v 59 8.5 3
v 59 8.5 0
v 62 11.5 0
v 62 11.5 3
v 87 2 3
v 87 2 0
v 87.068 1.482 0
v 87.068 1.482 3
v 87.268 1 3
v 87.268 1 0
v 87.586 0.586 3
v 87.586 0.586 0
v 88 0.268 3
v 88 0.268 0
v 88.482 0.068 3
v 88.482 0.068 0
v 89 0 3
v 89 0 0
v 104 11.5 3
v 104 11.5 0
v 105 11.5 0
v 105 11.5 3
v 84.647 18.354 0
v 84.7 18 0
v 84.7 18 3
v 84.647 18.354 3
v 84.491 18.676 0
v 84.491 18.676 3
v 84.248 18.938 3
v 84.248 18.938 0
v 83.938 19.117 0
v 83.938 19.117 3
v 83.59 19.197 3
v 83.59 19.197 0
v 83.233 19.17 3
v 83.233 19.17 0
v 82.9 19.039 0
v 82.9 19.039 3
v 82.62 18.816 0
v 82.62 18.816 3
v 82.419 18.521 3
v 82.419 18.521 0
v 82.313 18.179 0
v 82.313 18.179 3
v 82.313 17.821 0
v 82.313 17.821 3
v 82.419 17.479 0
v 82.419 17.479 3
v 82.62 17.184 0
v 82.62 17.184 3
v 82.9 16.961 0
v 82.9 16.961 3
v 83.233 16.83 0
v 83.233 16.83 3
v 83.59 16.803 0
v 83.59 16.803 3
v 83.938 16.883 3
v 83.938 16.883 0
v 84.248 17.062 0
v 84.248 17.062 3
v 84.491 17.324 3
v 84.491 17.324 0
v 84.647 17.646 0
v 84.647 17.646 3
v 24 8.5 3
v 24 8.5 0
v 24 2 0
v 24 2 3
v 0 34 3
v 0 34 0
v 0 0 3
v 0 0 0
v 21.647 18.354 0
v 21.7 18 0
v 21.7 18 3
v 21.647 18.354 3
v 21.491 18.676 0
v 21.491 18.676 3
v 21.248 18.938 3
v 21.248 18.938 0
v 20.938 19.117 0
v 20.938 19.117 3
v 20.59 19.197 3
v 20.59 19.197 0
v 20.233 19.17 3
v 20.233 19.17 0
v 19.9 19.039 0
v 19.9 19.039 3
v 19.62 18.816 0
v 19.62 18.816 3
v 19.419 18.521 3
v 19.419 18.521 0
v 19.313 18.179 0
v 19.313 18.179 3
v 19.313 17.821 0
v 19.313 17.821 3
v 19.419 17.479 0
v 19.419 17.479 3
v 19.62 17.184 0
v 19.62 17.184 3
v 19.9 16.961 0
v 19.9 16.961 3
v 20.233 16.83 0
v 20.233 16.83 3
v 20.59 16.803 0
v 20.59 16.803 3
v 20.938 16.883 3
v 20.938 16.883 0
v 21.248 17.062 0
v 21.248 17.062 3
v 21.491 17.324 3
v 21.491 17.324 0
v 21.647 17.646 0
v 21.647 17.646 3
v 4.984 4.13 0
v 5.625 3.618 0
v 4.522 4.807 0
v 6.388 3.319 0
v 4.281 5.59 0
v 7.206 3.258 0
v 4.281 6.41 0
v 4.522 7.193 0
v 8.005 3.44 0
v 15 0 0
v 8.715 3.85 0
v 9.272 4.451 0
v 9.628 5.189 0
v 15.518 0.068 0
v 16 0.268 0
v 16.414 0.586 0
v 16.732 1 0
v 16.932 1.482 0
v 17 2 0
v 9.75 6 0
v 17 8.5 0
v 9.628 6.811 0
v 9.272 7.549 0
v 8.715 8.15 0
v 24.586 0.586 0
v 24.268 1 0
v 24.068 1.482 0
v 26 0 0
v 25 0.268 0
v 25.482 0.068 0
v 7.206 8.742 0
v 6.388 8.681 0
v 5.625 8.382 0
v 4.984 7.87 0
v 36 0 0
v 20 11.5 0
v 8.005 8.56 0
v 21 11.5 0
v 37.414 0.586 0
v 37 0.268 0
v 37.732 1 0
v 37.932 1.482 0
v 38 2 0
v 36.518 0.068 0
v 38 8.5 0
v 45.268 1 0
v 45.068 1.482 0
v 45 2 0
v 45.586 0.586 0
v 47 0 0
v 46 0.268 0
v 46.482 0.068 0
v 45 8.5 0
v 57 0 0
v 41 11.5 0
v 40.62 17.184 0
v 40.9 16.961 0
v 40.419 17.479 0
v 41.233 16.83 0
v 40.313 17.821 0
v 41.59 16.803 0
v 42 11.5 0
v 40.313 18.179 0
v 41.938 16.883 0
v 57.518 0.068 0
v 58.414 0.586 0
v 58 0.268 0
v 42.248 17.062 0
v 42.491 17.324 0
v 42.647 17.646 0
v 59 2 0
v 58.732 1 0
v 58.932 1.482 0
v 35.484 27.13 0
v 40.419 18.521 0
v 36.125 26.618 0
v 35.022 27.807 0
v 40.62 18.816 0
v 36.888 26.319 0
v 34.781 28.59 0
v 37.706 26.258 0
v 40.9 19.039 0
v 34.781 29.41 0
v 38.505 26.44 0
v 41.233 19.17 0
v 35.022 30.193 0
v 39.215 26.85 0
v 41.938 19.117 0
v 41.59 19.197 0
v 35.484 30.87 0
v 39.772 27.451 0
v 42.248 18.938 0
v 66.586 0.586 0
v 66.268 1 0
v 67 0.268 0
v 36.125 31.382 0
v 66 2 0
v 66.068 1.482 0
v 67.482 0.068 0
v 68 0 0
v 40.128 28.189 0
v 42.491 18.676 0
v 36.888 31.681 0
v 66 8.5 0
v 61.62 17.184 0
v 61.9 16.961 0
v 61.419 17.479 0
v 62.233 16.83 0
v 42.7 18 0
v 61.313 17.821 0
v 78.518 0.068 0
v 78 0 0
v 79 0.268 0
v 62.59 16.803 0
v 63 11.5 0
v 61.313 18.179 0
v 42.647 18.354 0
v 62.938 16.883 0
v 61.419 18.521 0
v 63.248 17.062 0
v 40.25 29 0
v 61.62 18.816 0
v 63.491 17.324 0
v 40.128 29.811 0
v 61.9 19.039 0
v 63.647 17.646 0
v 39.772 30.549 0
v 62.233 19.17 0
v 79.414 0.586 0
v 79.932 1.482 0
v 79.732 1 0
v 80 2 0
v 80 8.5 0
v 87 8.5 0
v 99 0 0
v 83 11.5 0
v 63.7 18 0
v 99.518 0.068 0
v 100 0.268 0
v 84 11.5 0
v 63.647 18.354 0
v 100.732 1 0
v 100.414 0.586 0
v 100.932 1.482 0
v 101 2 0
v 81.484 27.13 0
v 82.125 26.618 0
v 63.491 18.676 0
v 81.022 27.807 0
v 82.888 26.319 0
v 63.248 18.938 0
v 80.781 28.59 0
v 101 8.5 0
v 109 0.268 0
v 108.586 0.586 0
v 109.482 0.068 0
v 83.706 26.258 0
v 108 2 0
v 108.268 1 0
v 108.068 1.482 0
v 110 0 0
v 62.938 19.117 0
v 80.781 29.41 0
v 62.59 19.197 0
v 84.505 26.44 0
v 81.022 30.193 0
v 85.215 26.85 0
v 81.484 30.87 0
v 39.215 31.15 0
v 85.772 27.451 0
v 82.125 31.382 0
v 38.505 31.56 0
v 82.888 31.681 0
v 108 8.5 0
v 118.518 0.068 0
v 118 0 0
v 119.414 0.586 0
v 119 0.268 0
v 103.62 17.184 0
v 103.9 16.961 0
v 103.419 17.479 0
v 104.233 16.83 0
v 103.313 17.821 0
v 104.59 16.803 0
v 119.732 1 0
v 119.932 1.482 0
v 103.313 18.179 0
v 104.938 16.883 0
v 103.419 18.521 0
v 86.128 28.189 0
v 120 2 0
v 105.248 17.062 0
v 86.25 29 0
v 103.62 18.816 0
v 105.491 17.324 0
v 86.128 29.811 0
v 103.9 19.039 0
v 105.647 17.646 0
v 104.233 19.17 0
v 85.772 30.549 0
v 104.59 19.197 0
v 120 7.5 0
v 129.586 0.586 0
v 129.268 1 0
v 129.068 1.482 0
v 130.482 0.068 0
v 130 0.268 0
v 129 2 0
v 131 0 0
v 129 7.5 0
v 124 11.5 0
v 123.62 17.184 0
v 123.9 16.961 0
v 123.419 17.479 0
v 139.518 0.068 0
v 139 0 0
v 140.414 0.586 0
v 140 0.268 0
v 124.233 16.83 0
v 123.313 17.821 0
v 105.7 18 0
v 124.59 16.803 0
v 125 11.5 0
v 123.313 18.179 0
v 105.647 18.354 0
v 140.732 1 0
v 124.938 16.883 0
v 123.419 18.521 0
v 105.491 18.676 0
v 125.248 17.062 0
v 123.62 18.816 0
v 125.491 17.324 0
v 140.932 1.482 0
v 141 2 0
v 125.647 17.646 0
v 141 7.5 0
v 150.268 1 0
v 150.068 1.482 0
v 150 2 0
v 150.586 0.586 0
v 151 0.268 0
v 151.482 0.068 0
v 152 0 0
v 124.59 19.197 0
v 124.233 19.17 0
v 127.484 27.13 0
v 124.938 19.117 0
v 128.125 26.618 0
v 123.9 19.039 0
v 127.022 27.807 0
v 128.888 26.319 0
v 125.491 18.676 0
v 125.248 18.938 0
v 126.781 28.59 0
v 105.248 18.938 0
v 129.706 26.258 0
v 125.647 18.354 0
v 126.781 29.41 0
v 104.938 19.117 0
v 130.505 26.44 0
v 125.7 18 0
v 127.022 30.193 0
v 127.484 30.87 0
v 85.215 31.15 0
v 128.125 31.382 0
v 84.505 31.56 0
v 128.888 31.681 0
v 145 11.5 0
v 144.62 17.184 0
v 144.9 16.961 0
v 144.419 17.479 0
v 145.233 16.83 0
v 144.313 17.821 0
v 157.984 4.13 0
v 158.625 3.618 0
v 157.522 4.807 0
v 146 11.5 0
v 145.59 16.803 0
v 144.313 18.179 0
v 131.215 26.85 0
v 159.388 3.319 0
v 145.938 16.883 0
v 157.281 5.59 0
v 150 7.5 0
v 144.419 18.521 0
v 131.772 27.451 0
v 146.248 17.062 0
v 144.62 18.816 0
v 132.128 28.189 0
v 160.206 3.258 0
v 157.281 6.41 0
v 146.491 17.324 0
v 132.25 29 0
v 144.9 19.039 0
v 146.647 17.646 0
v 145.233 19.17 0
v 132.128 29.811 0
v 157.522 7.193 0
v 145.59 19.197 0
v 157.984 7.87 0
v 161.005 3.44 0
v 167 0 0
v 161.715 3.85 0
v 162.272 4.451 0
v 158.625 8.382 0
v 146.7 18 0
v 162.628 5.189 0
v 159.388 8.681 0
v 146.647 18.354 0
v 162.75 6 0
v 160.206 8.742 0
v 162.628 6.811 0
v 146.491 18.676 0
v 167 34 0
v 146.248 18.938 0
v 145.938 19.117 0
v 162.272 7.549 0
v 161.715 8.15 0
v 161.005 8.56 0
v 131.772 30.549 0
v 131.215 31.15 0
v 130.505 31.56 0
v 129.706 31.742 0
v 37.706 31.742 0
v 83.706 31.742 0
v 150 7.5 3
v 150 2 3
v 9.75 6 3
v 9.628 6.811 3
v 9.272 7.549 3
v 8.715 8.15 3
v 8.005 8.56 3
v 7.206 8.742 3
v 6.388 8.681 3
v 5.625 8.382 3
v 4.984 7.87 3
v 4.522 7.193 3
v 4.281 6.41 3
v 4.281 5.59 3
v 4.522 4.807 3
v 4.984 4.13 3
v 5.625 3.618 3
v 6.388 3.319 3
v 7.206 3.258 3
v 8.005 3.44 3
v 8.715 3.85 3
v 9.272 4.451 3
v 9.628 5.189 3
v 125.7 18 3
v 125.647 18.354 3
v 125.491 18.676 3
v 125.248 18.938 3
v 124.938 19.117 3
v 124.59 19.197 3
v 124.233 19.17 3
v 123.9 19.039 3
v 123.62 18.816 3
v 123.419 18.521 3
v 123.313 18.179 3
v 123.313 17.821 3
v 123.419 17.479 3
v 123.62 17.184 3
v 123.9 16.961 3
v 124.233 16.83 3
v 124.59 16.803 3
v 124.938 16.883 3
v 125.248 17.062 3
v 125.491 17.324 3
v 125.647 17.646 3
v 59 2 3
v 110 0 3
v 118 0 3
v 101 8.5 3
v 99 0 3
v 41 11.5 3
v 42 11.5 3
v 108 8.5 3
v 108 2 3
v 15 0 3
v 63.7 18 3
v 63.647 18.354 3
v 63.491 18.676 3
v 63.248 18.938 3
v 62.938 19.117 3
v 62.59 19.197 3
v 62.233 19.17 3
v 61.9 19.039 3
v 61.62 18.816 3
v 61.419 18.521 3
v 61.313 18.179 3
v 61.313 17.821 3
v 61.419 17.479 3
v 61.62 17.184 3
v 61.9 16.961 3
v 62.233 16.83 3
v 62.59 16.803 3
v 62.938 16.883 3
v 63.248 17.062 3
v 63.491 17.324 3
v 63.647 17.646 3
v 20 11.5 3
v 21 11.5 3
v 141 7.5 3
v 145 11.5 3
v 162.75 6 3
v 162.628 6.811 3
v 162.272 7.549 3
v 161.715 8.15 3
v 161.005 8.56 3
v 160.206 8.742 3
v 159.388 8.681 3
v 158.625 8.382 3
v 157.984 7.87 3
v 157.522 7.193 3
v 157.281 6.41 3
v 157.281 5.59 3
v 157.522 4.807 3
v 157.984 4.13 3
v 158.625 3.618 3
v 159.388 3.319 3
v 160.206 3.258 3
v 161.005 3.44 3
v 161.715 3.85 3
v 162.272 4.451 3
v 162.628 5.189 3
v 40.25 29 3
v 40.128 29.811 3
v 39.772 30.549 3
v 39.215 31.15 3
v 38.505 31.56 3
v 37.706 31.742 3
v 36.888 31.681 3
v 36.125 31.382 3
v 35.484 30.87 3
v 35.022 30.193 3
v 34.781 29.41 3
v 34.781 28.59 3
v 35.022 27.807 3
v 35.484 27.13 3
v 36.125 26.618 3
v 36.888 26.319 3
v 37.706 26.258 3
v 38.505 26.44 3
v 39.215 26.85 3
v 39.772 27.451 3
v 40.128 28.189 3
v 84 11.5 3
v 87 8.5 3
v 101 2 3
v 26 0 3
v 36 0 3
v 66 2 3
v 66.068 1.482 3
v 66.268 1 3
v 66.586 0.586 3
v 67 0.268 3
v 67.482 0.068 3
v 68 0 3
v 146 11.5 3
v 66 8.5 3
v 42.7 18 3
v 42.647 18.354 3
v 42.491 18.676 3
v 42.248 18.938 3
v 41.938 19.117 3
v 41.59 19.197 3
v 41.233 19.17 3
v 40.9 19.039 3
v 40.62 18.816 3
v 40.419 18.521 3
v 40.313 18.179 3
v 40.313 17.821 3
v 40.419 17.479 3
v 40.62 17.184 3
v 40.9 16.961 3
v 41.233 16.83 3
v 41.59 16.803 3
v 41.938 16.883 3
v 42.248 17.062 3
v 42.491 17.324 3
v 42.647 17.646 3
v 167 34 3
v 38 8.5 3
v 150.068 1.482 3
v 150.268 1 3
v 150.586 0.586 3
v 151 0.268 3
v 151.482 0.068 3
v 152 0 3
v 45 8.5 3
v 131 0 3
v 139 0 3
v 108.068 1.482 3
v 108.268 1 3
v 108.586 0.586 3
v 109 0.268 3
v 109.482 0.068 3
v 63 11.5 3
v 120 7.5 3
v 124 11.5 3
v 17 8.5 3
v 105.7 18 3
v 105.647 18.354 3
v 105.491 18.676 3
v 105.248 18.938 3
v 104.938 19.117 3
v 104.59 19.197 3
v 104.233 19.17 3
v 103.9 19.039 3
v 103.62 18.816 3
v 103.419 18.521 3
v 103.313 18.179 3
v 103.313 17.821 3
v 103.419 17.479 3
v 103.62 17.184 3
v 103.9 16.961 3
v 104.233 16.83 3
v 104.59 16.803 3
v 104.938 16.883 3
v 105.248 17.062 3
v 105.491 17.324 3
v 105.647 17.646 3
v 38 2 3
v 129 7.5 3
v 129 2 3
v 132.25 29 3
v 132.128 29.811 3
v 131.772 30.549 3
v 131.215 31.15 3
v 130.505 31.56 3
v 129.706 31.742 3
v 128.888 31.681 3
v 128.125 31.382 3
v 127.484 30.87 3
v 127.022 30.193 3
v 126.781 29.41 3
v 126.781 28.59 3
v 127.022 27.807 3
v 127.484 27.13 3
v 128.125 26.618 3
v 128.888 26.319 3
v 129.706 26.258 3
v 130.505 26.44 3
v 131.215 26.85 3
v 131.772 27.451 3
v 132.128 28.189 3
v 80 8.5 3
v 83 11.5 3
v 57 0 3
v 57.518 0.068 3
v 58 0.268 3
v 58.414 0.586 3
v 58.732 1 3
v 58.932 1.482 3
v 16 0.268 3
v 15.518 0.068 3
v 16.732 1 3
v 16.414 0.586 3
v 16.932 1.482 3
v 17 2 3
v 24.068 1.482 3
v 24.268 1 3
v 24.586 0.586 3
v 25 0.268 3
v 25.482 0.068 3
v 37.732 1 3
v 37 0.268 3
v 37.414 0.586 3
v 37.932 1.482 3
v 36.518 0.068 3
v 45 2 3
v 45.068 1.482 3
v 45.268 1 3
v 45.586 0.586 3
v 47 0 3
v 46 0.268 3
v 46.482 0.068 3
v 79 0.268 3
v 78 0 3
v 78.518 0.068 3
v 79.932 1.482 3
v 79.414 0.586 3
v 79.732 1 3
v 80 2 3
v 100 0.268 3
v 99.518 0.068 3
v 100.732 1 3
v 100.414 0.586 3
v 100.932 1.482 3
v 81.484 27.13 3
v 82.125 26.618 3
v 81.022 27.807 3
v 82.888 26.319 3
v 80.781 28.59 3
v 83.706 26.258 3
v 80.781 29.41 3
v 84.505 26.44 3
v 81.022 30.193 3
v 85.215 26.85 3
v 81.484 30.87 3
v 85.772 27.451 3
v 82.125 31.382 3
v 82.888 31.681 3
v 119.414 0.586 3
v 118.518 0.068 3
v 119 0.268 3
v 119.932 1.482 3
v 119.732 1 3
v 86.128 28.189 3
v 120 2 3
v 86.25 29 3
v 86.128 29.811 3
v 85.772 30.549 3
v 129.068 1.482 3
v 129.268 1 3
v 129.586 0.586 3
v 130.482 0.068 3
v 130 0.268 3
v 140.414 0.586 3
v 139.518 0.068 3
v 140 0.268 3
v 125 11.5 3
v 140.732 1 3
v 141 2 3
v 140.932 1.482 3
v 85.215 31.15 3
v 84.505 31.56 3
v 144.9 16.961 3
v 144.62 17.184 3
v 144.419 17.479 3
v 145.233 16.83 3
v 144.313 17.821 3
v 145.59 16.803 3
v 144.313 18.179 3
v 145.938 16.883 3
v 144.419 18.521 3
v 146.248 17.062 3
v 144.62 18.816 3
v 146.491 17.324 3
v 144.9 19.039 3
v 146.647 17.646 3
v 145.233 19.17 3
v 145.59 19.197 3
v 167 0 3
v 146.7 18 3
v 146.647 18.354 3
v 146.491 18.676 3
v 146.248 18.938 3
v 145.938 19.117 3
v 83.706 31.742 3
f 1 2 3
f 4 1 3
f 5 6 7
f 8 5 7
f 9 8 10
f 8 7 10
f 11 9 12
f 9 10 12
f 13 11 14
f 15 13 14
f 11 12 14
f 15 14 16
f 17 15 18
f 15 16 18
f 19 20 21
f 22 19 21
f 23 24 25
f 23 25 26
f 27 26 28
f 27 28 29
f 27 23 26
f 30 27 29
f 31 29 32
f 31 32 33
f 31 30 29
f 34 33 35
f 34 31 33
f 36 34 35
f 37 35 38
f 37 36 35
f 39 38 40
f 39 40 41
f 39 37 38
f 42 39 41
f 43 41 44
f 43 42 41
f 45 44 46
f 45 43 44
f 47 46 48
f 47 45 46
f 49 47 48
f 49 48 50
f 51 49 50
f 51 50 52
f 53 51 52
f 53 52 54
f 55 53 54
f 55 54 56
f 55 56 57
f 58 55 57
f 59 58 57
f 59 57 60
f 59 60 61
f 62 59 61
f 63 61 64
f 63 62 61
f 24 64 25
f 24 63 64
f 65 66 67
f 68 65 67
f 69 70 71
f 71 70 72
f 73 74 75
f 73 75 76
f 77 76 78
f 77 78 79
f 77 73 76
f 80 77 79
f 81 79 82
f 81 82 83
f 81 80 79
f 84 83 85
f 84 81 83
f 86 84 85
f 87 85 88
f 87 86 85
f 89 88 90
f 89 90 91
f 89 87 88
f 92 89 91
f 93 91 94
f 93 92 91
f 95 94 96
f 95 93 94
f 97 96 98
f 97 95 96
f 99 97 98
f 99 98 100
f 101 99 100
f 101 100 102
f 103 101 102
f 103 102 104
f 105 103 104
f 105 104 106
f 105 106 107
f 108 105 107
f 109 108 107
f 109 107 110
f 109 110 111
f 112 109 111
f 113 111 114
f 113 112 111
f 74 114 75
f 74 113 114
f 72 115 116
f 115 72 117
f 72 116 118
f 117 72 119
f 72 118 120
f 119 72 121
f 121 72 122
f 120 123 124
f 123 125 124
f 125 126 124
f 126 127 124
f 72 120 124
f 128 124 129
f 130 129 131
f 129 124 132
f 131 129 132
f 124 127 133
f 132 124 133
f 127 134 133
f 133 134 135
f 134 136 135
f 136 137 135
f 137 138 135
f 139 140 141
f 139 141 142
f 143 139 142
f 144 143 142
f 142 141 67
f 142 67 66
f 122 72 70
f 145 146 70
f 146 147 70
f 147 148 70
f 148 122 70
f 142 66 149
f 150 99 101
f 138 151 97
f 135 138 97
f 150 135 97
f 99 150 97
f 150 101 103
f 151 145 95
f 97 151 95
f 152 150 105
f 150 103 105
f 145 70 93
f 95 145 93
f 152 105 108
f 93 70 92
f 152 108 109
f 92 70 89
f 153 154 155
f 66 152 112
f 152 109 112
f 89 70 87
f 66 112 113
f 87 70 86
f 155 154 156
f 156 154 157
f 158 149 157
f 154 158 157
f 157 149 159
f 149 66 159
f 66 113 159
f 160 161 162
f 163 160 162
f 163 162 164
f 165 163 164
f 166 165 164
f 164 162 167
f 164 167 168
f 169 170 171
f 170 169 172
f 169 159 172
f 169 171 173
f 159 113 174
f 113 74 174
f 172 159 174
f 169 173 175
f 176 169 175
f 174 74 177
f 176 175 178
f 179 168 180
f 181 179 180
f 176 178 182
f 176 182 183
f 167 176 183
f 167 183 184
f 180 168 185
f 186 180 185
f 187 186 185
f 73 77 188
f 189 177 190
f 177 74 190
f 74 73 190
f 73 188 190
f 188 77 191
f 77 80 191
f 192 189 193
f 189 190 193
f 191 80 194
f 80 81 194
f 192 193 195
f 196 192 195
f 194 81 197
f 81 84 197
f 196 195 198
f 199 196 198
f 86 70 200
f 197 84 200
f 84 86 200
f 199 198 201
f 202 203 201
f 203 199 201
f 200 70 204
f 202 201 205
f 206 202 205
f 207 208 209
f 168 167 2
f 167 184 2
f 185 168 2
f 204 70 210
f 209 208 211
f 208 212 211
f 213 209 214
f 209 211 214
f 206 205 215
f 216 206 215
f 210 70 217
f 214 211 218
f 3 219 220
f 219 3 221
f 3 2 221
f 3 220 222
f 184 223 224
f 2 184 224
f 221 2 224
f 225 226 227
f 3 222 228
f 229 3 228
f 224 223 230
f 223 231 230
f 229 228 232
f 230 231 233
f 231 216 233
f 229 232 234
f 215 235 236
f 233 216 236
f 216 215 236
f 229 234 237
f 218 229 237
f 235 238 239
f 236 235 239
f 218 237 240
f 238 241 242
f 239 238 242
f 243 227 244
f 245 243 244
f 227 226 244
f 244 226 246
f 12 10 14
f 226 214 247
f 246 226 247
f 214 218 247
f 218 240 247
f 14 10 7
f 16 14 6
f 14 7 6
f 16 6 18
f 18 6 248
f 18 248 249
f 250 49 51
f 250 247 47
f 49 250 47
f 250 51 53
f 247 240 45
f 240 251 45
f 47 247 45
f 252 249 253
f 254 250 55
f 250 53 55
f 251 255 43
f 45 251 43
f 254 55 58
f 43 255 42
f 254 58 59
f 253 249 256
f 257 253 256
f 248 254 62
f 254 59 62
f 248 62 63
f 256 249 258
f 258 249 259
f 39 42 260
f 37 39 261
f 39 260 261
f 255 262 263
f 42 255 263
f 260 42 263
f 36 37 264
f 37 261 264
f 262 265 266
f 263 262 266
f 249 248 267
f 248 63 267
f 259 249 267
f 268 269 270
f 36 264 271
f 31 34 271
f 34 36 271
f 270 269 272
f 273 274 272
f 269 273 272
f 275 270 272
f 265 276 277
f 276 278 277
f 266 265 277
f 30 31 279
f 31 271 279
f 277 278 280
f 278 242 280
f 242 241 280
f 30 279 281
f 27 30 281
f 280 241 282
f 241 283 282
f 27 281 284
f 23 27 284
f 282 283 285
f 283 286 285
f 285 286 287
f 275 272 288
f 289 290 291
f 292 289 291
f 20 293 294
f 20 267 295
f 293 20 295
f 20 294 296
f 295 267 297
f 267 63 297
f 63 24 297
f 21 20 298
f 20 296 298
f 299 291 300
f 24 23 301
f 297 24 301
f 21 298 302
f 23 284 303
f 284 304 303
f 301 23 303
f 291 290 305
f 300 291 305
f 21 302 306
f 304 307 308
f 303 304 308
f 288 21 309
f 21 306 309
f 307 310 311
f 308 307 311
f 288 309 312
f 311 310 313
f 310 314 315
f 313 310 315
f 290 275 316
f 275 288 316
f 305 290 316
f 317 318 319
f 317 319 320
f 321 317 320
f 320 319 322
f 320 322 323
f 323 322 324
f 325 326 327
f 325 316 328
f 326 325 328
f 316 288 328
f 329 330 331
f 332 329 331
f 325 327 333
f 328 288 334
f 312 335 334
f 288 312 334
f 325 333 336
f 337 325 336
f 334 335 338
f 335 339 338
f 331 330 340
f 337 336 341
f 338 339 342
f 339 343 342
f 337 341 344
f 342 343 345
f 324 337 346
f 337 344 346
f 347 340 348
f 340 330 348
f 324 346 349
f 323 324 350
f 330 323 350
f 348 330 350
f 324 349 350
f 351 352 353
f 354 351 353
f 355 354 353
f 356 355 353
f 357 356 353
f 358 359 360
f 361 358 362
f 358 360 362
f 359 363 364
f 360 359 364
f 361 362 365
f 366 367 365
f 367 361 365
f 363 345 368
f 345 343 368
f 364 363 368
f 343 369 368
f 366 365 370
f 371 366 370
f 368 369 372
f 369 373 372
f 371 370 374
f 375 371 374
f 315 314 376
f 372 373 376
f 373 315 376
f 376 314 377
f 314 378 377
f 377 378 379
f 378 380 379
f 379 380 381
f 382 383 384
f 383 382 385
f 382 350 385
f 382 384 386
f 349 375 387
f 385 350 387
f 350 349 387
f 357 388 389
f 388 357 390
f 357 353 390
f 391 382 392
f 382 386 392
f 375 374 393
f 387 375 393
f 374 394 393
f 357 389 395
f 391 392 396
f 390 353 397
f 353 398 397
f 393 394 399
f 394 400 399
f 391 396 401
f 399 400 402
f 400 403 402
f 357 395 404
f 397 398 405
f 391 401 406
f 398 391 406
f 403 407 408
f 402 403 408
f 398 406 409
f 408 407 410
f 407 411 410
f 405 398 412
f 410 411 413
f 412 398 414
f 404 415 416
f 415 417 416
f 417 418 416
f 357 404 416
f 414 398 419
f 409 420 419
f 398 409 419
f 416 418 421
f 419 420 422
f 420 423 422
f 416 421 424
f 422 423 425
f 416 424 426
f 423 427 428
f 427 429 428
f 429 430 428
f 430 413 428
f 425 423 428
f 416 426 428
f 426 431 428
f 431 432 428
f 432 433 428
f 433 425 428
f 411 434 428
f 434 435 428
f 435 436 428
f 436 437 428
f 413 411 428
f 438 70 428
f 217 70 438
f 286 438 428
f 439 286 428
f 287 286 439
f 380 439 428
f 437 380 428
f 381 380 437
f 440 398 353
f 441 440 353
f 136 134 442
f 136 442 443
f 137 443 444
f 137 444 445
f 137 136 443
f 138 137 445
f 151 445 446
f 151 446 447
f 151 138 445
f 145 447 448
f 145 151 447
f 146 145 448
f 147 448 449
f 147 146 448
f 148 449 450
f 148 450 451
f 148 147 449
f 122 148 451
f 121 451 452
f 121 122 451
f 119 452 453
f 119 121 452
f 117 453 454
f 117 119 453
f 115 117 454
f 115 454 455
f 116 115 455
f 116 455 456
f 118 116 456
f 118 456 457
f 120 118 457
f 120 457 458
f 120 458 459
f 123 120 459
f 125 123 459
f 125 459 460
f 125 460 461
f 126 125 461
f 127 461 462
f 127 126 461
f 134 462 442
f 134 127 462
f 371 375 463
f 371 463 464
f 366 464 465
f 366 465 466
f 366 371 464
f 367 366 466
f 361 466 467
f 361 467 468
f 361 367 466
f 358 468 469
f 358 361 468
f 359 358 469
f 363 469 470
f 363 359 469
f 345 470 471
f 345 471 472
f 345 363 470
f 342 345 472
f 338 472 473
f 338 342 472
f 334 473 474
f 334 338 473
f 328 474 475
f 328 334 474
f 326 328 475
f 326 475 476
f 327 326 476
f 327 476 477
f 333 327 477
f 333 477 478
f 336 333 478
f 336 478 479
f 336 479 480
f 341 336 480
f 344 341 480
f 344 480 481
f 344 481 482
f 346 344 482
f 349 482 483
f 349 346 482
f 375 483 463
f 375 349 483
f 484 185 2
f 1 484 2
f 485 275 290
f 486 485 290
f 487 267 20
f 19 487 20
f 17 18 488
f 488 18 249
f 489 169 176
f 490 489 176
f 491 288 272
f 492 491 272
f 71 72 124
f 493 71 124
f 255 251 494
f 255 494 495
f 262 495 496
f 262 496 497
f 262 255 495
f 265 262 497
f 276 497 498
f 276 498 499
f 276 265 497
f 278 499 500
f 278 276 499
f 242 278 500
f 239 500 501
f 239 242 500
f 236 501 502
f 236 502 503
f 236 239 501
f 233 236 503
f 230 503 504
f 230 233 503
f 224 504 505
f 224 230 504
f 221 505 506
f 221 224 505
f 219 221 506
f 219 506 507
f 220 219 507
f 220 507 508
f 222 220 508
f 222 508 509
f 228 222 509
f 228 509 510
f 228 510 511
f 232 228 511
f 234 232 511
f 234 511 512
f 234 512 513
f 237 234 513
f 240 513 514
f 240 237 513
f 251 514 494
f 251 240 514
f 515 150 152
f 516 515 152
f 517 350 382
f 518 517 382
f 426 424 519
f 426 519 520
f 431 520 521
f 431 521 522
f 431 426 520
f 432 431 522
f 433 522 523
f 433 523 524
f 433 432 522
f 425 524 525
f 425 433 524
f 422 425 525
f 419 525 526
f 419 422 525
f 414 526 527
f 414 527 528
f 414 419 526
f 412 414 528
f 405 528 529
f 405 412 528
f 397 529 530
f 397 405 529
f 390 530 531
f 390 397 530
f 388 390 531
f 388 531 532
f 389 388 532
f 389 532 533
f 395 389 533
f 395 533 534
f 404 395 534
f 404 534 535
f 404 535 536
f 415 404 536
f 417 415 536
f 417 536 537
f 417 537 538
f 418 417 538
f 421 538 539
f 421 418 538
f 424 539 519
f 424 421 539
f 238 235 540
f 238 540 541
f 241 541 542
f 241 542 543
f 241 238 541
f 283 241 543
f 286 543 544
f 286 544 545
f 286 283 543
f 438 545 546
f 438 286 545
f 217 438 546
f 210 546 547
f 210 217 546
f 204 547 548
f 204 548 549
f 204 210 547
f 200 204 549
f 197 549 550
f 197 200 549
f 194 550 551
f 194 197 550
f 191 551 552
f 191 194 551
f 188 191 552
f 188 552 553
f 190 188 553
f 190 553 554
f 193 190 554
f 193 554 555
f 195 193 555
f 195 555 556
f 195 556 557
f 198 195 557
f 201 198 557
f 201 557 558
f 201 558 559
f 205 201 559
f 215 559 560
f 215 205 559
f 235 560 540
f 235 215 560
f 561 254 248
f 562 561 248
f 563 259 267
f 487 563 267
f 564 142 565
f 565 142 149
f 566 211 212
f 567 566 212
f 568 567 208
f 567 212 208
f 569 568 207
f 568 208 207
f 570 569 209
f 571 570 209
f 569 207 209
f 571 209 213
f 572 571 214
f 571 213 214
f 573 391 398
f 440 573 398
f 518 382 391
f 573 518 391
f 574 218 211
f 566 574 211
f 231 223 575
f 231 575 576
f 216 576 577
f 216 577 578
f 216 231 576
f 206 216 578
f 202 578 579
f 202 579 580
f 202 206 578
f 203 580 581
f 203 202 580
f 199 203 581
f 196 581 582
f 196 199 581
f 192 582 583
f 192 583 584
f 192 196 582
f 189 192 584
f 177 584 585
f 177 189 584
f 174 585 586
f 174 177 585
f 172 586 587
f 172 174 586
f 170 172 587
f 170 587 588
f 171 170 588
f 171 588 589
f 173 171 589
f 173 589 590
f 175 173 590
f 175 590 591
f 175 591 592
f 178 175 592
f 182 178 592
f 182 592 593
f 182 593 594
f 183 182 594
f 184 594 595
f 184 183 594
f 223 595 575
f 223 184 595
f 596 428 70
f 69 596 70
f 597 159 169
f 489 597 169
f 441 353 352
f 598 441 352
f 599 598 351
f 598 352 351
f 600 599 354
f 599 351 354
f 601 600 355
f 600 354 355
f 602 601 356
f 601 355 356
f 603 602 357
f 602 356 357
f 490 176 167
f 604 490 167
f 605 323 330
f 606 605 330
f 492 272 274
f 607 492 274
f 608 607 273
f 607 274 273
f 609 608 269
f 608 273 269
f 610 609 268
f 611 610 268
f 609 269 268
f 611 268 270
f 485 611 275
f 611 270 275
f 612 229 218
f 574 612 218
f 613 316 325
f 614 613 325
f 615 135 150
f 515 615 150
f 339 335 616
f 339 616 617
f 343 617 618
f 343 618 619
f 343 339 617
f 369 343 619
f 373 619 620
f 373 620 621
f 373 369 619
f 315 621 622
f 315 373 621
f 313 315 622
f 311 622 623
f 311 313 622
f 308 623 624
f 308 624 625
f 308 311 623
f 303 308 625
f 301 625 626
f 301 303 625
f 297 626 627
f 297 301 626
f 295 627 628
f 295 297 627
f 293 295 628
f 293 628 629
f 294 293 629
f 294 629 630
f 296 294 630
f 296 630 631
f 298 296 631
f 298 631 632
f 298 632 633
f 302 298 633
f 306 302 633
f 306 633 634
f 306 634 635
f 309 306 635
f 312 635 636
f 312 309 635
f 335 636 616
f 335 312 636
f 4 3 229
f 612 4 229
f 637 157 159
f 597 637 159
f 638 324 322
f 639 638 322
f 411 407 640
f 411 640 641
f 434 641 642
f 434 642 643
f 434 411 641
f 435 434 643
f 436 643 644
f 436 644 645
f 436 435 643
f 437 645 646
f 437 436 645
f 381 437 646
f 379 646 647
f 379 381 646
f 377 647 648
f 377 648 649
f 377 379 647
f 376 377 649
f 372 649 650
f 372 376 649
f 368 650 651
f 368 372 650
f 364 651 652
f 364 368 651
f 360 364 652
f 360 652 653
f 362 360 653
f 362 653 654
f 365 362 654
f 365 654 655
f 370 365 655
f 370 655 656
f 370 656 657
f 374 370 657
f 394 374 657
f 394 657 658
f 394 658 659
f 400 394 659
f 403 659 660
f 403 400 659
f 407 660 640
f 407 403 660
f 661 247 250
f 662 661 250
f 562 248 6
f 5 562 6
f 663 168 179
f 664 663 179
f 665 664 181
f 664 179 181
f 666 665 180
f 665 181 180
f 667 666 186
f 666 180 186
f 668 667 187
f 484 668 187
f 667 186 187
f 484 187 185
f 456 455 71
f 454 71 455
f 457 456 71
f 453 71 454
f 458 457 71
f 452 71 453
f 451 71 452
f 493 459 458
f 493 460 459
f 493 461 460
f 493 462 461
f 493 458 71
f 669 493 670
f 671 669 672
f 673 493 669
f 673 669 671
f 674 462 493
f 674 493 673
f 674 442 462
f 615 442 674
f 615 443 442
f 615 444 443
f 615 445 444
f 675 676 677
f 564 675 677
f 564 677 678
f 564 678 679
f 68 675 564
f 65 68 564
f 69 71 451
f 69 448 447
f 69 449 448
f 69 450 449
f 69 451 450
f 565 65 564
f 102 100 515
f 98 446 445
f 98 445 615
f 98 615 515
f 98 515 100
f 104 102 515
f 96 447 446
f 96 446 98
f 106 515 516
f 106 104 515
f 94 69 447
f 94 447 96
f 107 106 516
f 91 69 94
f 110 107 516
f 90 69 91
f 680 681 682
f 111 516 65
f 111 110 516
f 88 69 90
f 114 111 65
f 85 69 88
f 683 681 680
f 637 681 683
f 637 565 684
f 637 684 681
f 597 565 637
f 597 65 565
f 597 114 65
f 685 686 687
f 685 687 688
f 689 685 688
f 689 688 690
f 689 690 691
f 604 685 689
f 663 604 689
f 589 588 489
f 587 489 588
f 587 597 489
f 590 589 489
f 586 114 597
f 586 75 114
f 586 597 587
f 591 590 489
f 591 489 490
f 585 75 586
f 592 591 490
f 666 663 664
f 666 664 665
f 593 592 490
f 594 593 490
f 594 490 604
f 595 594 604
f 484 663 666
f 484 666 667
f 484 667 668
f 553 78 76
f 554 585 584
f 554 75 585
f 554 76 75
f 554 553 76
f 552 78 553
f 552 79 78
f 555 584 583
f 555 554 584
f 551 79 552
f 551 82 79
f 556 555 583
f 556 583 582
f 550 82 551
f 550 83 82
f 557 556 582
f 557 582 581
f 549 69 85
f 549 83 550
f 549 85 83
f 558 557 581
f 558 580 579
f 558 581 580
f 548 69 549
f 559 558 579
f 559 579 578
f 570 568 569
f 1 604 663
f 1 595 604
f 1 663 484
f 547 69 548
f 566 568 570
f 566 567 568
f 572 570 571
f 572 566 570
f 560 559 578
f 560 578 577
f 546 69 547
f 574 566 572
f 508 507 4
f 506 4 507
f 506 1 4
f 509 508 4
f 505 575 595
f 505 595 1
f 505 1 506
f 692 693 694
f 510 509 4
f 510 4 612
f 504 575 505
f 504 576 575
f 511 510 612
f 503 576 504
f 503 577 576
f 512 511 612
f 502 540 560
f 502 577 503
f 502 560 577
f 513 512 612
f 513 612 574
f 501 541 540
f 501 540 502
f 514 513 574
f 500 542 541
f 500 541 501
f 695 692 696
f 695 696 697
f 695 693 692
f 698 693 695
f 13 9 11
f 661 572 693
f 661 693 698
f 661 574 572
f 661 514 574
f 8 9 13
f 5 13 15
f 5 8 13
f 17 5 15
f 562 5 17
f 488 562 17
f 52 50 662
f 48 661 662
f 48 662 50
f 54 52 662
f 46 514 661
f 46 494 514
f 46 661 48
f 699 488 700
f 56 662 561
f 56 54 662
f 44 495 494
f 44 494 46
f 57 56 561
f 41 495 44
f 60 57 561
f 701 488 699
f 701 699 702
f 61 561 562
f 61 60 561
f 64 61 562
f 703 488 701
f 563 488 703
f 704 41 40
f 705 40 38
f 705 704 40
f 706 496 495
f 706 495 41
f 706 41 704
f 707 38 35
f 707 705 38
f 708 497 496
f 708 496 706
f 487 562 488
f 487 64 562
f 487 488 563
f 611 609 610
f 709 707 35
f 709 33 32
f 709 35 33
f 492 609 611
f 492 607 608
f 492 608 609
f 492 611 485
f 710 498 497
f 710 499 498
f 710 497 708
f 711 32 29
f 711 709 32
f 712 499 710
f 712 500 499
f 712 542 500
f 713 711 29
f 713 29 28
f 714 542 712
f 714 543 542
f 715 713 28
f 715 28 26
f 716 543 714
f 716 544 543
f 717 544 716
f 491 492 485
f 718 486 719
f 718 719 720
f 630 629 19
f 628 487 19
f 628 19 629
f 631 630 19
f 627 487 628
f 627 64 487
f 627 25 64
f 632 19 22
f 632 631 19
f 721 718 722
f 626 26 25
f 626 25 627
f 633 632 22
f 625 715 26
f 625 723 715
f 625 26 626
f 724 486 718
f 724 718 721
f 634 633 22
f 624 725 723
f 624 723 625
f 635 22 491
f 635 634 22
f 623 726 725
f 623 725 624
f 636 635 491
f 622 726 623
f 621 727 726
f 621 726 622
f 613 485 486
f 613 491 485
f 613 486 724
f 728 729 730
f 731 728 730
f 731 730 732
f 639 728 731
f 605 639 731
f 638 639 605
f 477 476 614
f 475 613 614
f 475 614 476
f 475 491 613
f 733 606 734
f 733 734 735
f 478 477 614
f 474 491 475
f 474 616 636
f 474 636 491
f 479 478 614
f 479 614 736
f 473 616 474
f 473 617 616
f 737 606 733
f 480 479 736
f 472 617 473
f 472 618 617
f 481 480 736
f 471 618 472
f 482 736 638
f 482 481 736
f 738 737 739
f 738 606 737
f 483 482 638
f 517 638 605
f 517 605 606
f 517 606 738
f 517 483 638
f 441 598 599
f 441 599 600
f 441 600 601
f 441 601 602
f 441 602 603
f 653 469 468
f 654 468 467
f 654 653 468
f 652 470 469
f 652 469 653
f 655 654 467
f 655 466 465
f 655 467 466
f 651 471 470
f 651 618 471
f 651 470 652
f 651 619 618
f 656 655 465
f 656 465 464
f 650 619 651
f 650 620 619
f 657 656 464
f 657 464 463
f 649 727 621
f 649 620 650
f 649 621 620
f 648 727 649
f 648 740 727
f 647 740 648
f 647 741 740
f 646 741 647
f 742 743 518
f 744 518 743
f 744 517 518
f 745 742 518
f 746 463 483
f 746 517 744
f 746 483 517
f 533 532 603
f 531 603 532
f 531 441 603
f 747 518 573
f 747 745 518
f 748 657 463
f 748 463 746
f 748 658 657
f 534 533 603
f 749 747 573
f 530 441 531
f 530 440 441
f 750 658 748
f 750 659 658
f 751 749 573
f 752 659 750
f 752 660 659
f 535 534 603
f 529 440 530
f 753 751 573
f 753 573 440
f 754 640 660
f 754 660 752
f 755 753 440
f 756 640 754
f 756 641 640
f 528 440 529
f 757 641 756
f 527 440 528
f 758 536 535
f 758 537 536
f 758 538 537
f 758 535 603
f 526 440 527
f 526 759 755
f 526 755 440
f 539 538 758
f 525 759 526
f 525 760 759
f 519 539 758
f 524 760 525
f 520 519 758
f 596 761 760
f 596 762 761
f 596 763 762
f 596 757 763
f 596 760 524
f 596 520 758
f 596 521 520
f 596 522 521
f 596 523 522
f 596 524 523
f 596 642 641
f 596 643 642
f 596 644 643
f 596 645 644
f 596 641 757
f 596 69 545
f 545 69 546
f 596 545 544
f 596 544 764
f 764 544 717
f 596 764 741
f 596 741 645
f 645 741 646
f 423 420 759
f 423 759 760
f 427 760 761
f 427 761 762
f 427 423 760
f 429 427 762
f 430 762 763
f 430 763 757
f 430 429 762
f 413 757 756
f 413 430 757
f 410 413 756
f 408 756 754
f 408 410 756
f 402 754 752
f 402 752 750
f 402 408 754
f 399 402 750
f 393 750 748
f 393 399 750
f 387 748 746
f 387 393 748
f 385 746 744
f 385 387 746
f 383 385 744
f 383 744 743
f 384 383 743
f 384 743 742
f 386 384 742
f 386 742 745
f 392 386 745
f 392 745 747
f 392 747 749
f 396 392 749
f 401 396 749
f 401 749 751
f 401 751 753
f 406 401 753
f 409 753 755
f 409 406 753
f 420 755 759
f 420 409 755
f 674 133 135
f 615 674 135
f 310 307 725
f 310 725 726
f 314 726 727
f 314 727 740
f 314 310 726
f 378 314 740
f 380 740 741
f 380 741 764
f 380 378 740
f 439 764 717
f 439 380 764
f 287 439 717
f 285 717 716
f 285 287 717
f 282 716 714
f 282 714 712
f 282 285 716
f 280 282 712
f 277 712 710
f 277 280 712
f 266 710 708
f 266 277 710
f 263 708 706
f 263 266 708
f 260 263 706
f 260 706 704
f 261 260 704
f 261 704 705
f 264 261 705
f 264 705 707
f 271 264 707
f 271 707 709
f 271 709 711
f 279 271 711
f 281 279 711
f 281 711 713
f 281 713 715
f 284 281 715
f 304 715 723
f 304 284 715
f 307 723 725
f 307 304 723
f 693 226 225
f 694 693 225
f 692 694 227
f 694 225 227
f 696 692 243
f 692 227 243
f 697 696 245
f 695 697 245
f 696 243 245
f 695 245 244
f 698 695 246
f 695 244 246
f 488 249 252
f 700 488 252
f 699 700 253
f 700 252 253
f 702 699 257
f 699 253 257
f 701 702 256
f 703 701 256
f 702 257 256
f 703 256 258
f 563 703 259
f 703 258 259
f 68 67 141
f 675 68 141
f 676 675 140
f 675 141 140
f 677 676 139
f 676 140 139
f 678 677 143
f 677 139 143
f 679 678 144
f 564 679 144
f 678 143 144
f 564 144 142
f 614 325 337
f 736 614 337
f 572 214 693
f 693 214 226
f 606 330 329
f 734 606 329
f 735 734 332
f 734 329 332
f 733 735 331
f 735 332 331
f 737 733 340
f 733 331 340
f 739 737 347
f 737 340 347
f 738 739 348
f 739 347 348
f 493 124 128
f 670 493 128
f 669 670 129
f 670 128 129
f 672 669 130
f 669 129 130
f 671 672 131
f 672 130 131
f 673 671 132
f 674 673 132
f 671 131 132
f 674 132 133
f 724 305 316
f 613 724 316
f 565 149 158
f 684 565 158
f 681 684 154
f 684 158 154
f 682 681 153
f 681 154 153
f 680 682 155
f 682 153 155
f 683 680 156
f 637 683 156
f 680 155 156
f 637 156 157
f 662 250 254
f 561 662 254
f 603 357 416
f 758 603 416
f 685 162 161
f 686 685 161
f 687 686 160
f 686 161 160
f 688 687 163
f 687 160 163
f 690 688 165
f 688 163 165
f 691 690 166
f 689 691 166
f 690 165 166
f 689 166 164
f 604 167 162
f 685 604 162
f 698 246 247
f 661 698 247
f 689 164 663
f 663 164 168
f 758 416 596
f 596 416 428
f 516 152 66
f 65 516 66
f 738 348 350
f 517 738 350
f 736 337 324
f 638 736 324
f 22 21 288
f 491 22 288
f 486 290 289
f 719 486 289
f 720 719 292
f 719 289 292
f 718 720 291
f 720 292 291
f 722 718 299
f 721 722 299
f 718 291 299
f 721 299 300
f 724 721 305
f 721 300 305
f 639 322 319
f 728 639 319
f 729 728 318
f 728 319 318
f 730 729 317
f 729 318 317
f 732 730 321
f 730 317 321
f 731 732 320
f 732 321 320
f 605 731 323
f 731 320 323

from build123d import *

# Parameters (mm, degrees)
F0_R     = 2.75
F0_R_2   = 1.2
F1_DEPTH = 3


with BuildPart() as f1:
    # F0 (on Top) → F1 (new body)
    with BuildSketch(Plane.XY):
        with BuildLine():
            Line((101, 8.5), (104, 11.5))
            Line((104, 11.5), (104.5, 12))
            Line((104.5, 12), (104, 12))
            ThreePointArc((104, 12), (101.87868, 11.12132), (101, 9))
            Line((101, 9), (101, 8.5))
        make_face()
        with BuildLine():
            Line((105, 11.5), (108, 8.5))
            Line((108, 8.5), (108, 9))
            ThreePointArc((108, 9), (107.12132, 11.12132), (105, 12))
            Line((105, 12), (104.5, 12))
            Line((104.5, 12), (105, 11.5))
        make_face()
        Polygon((104, 11.5), (105, 11.5), (104.5, 12), align=None)
        with BuildLine():
            Line((0, 34), (0, 0))
            Line((0, 0), (15, 0))
            ThreePointArc((15, 0), (16.414214, 0.585786), (17, 2))
            Line((17, 2), (17, 8.5))
            Line((17, 8.5), (17, 9))
            ThreePointArc((17, 9), (17.87868, 11.12132), (20, 12))
            Line((20, 12), (20.5, 12))
            Line((20.5, 12), (21, 12))
            ThreePointArc((21, 12), (23.12132, 11.12132), (24, 9))
            Line((24, 9), (24, 8.5))
            Line((24, 8.5), (24, 2))
            ThreePointArc((24, 2), (24.585786, 0.585786), (26, 0))
            Line((26, 0), (36, 0))
            ThreePointArc((36, 0), (37.414214, 0.585786), (38, 2))
            Line((38, 2), (38, 8.5))
            Line((38, 8.5), (38, 9))
            ThreePointArc((38, 9), (38.87868, 11.12132), (41, 12))
            Line((41, 12), (41.5, 12))
            Line((41.5, 12), (42, 12))
            ThreePointArc((42, 12), (44.12132, 11.12132), (45, 9))
            Line((45, 9), (45, 8.5))
            Line((45, 8.5), (45, 2))
            ThreePointArc((45, 2), (45.585786, 0.585786), (47, 0))
            Line((47, 0), (57, 0))
            ThreePointArc((57, 0), (58.414214, 0.585786), (59, 2))
            Line((59, 2), (59, 8.5))
            Line((59, 8.5), (59, 9))
            ThreePointArc((59, 9), (59.87868, 11.12132), (62, 12))
            Line((62, 12), (62.5, 12))
            Line((62.5, 12), (63, 12))
            ThreePointArc((63, 12), (65.12132, 11.12132), (66, 9))
            Line((66, 9), (66, 8.5))
            Line((66, 8.5), (66, 2))
            ThreePointArc((66, 2), (66.585786, 0.585786), (68, 0))
            Line((68, 0), (78, 0))
            ThreePointArc((78, 0), (79.414214, 0.585786), (80, 2))
            Line((80, 2), (80, 8.5))
            Line((80, 8.5), (80, 9))
            ThreePointArc((80, 9), (80.87868, 11.12132), (83, 12))
            Line((83, 12), (83.5, 12))
            Line((83.5, 12), (84, 12))
            ThreePointArc((84, 12), (86.12132, 11.12132), (87, 9))
            Line((87, 9), (87, 8.5))
            Line((87, 8.5), (87, 2))
            ThreePointArc((87, 2), (87.585786, 0.585786), (89, 0))
            Line((89, 0), (99, 0))
            ThreePointArc((99, 0), (100.414214, 0.585786), (101, 2))
            Line((101, 2), (101, 8.5))
            Line((101, 8.5), (101, 9))
            ThreePointArc((101, 9), (101.87868, 11.12132), (104, 12))
            Line((104, 12), (104.5, 12))
            Line((104.5, 12), (105, 12))
            ThreePointArc((105, 12), (107.12132, 11.12132), (108, 9))
            Line((108, 9), (108, 8.5))
            Line((108, 8.5), (108, 2))
            ThreePointArc((108, 2), (108.585786, 0.585786), (110, 0))
            Line((110, 0), (118, 0))
            ThreePointArc((118, 0), (119.414214, 0.585786), (120, 2))
            Line((120, 2), (120, 7.5))
            Line((120, 7.5), (120, 8))
            ThreePointArc((120, 8), (121.171573, 10.828427), (124, 12))
            Line((124, 12), (124.5, 12))
            Line((124.5, 12), (125, 12))
            ThreePointArc((125, 12), (127.828427, 10.828427), (129, 8))
            Line((129, 8), (129, 7.5))
            Line((129, 7.5), (129, 2))
            ThreePointArc((129, 2), (129.585786, 0.585786), (131, 0))
            Line((131, 0), (139, 0))
            ThreePointArc((139, 0), (140.414214, 0.585786), (141, 2))
            Line((141, 2), (141, 7.5))
            Line((141, 7.5), (141, 8))
            ThreePointArc((141, 8), (142.171573, 10.828427), (145, 12))
            Line((145, 12), (145.5, 12))
            Line((145.5, 12), (146, 12))
            ThreePointArc((146, 12), (148.828427, 10.828427), (150, 8))
            Line((150, 8), (150, 7.5))
            Line((150, 7.5), (150, 2))
            ThreePointArc((150, 2), (150.585786, 0.585786), (152, 0))
            Line((152, 0), (167, 0))
            Line((167, 0), (167, 34))
            Line((167, 34), (0, 34))
        make_face()
        with Locations((7, 6)):
            Circle(F0_R, mode=Mode.SUBTRACT)
        with Locations((160, 6)):
            Circle(F0_R, mode=Mode.SUBTRACT)
        with Locations((20.5, 18)):
            Circle(F0_R_2, mode=Mode.SUBTRACT)
        with Locations((41.5, 18)):
            Circle(F0_R_2, mode=Mode.SUBTRACT)
        with Locations((62.5, 18)):
            Circle(F0_R_2, mode=Mode.SUBTRACT)
        with Locations((37.5, 29)):
            Circle(F0_R, mode=Mode.SUBTRACT)
        with Locations((83.5, 18)):
            Circle(F0_R_2, mode=Mode.SUBTRACT)
        with Locations((104.5, 18)):
            Circle(F0_R_2, mode=Mode.SUBTRACT)
        with Locations((124.5, 18)):
            Circle(F0_R_2, mode=Mode.SUBTRACT)
        with Locations((145.5, 18)):
            Circle(F0_R_2, mode=Mode.SUBTRACT)
        with Locations((83.5, 29)):
            Circle(F0_R, mode=Mode.SUBTRACT)
        with Locations((129.5, 29)):
            Circle(F0_R, mode=Mode.SUBTRACT)
        with BuildLine():
            Line((146, 11.5), (150, 7.5))
            Line((150, 7.5), (150, 8))
            ThreePointArc((150, 8), (148.828427, 10.828427), (146, 12))
            Line((146, 12), (145.5, 12))
            Line((145.5, 12), (146, 11.5))
        make_face()
        Polygon((145, 11.5), (146, 11.5), (145.5, 12), align=None)
        with BuildLine():
            Line((145, 11.5), (145.5, 12))
            Line((145.5, 12), (145, 12))
            ThreePointArc((145, 12), (142.171573, 10.828427), (141, 8))
            Line((141, 8), (141, 7.5))
            Line((141, 7.5), (145, 11.5))
        make_face()
        with BuildLine():
            Line((125, 11.5), (129, 7.5))
            Line((129, 7.5), (129, 8))
            ThreePointArc((129, 8), (127.828427, 10.828427), (125, 12))
            Line((125, 12), (124.5, 12))
            Line((124.5, 12), (125, 11.5))
        make_face()
        Polygon((124, 11.5), (125, 11.5), (124.5, 12), align=None)
        with BuildLine():
            Line((124, 11.5), (124.5, 12))
            Line((124.5, 12), (124, 12))
            ThreePointArc((124, 12), (121.171573, 10.828427), (120, 8))
            Line((120, 8), (120, 7.5))
            Line((120, 7.5), (124, 11.5))
        make_face()
        with BuildLine():
            Line((84, 12), (83.5, 12))
            Line((83.5, 12), (84, 11.5))
            Line((84, 11.5), (87, 8.5))
            Line((87, 8.5), (87, 9))
            ThreePointArc((87, 9), (86.12132, 11.12132), (84, 12))
        make_face()
        Polygon((83.5, 12), (83, 11.5), (84, 11.5), align=None)
        with BuildLine():
            Line((80, 9), (80, 8.5))
            Line((80, 8.5), (83, 11.5))
            Line((83, 11.5), (83.5, 12))
            Line((83.5, 12), (83, 12))
            ThreePointArc((83, 12), (80.87868, 11.12132), (80, 9))
        make_face()
        with BuildLine():
            Line((63, 12), (62.5, 12))
            Line((62.5, 12), (63, 11.5))
            Line((63, 11.5), (66, 8.5))
            Line((66, 8.5), (66, 9))
            ThreePointArc((66, 9), (65.12132, 11.12132), (63, 12))
        make_face()
        Polygon((62.5, 12), (62, 11.5), (63, 11.5), align=None)
        with BuildLine():
            Line((59, 9), (59, 8.5))
            Line((59, 8.5), (62, 11.5))
            Line((62, 11.5), (62.5, 12))
            Line((62.5, 12), (62, 12))
            ThreePointArc((62, 12), (59.87868, 11.12132), (59, 9))
        make_face()
        with BuildLine():
            Line((42, 12), (41.5, 12))
            Line((41.5, 12), (42, 11.5))
            Line((42, 11.5), (45, 8.5))
            Line((45, 8.5), (45, 9))
            ThreePointArc((45, 9), (44.12132, 11.12132), (42, 12))
        make_face()
        Polygon((41.5, 12), (41, 11.5), (42, 11.5), align=None)
        with BuildLine():
            Line((38, 9), (38, 8.5))
            Line((38, 8.5), (41, 11.5))
            Line((41, 11.5), (41.5, 12))
            Line((41.5, 12), (41, 12))
            ThreePointArc((41, 12), (38.87868, 11.12132), (38, 9))
        make_face()
        with BuildLine():
            Line((21, 12), (20.5, 12))
            Line((20.5, 12), (21, 11.5))
            Line((21, 11.5), (24, 8.5))
            Line((24, 8.5), (24, 9))
            ThreePointArc((24, 9), (23.12132, 11.12132), (21, 12))
        make_face()
        Polygon((20.5, 12), (20, 11.5), (21, 11.5), align=None)
        with BuildLine():
            Line((17, 9), (17, 8.5))
            Line((17, 8.5), (20, 11.5))
            Line((20, 11.5), (20.5, 12))
            Line((20.5, 12), (20, 12))
            ThreePointArc((20, 12), (17.87868, 11.12132), (17, 9))
        make_face()
    extrude(amount=F1_DEPTH)


solid = f1.part
